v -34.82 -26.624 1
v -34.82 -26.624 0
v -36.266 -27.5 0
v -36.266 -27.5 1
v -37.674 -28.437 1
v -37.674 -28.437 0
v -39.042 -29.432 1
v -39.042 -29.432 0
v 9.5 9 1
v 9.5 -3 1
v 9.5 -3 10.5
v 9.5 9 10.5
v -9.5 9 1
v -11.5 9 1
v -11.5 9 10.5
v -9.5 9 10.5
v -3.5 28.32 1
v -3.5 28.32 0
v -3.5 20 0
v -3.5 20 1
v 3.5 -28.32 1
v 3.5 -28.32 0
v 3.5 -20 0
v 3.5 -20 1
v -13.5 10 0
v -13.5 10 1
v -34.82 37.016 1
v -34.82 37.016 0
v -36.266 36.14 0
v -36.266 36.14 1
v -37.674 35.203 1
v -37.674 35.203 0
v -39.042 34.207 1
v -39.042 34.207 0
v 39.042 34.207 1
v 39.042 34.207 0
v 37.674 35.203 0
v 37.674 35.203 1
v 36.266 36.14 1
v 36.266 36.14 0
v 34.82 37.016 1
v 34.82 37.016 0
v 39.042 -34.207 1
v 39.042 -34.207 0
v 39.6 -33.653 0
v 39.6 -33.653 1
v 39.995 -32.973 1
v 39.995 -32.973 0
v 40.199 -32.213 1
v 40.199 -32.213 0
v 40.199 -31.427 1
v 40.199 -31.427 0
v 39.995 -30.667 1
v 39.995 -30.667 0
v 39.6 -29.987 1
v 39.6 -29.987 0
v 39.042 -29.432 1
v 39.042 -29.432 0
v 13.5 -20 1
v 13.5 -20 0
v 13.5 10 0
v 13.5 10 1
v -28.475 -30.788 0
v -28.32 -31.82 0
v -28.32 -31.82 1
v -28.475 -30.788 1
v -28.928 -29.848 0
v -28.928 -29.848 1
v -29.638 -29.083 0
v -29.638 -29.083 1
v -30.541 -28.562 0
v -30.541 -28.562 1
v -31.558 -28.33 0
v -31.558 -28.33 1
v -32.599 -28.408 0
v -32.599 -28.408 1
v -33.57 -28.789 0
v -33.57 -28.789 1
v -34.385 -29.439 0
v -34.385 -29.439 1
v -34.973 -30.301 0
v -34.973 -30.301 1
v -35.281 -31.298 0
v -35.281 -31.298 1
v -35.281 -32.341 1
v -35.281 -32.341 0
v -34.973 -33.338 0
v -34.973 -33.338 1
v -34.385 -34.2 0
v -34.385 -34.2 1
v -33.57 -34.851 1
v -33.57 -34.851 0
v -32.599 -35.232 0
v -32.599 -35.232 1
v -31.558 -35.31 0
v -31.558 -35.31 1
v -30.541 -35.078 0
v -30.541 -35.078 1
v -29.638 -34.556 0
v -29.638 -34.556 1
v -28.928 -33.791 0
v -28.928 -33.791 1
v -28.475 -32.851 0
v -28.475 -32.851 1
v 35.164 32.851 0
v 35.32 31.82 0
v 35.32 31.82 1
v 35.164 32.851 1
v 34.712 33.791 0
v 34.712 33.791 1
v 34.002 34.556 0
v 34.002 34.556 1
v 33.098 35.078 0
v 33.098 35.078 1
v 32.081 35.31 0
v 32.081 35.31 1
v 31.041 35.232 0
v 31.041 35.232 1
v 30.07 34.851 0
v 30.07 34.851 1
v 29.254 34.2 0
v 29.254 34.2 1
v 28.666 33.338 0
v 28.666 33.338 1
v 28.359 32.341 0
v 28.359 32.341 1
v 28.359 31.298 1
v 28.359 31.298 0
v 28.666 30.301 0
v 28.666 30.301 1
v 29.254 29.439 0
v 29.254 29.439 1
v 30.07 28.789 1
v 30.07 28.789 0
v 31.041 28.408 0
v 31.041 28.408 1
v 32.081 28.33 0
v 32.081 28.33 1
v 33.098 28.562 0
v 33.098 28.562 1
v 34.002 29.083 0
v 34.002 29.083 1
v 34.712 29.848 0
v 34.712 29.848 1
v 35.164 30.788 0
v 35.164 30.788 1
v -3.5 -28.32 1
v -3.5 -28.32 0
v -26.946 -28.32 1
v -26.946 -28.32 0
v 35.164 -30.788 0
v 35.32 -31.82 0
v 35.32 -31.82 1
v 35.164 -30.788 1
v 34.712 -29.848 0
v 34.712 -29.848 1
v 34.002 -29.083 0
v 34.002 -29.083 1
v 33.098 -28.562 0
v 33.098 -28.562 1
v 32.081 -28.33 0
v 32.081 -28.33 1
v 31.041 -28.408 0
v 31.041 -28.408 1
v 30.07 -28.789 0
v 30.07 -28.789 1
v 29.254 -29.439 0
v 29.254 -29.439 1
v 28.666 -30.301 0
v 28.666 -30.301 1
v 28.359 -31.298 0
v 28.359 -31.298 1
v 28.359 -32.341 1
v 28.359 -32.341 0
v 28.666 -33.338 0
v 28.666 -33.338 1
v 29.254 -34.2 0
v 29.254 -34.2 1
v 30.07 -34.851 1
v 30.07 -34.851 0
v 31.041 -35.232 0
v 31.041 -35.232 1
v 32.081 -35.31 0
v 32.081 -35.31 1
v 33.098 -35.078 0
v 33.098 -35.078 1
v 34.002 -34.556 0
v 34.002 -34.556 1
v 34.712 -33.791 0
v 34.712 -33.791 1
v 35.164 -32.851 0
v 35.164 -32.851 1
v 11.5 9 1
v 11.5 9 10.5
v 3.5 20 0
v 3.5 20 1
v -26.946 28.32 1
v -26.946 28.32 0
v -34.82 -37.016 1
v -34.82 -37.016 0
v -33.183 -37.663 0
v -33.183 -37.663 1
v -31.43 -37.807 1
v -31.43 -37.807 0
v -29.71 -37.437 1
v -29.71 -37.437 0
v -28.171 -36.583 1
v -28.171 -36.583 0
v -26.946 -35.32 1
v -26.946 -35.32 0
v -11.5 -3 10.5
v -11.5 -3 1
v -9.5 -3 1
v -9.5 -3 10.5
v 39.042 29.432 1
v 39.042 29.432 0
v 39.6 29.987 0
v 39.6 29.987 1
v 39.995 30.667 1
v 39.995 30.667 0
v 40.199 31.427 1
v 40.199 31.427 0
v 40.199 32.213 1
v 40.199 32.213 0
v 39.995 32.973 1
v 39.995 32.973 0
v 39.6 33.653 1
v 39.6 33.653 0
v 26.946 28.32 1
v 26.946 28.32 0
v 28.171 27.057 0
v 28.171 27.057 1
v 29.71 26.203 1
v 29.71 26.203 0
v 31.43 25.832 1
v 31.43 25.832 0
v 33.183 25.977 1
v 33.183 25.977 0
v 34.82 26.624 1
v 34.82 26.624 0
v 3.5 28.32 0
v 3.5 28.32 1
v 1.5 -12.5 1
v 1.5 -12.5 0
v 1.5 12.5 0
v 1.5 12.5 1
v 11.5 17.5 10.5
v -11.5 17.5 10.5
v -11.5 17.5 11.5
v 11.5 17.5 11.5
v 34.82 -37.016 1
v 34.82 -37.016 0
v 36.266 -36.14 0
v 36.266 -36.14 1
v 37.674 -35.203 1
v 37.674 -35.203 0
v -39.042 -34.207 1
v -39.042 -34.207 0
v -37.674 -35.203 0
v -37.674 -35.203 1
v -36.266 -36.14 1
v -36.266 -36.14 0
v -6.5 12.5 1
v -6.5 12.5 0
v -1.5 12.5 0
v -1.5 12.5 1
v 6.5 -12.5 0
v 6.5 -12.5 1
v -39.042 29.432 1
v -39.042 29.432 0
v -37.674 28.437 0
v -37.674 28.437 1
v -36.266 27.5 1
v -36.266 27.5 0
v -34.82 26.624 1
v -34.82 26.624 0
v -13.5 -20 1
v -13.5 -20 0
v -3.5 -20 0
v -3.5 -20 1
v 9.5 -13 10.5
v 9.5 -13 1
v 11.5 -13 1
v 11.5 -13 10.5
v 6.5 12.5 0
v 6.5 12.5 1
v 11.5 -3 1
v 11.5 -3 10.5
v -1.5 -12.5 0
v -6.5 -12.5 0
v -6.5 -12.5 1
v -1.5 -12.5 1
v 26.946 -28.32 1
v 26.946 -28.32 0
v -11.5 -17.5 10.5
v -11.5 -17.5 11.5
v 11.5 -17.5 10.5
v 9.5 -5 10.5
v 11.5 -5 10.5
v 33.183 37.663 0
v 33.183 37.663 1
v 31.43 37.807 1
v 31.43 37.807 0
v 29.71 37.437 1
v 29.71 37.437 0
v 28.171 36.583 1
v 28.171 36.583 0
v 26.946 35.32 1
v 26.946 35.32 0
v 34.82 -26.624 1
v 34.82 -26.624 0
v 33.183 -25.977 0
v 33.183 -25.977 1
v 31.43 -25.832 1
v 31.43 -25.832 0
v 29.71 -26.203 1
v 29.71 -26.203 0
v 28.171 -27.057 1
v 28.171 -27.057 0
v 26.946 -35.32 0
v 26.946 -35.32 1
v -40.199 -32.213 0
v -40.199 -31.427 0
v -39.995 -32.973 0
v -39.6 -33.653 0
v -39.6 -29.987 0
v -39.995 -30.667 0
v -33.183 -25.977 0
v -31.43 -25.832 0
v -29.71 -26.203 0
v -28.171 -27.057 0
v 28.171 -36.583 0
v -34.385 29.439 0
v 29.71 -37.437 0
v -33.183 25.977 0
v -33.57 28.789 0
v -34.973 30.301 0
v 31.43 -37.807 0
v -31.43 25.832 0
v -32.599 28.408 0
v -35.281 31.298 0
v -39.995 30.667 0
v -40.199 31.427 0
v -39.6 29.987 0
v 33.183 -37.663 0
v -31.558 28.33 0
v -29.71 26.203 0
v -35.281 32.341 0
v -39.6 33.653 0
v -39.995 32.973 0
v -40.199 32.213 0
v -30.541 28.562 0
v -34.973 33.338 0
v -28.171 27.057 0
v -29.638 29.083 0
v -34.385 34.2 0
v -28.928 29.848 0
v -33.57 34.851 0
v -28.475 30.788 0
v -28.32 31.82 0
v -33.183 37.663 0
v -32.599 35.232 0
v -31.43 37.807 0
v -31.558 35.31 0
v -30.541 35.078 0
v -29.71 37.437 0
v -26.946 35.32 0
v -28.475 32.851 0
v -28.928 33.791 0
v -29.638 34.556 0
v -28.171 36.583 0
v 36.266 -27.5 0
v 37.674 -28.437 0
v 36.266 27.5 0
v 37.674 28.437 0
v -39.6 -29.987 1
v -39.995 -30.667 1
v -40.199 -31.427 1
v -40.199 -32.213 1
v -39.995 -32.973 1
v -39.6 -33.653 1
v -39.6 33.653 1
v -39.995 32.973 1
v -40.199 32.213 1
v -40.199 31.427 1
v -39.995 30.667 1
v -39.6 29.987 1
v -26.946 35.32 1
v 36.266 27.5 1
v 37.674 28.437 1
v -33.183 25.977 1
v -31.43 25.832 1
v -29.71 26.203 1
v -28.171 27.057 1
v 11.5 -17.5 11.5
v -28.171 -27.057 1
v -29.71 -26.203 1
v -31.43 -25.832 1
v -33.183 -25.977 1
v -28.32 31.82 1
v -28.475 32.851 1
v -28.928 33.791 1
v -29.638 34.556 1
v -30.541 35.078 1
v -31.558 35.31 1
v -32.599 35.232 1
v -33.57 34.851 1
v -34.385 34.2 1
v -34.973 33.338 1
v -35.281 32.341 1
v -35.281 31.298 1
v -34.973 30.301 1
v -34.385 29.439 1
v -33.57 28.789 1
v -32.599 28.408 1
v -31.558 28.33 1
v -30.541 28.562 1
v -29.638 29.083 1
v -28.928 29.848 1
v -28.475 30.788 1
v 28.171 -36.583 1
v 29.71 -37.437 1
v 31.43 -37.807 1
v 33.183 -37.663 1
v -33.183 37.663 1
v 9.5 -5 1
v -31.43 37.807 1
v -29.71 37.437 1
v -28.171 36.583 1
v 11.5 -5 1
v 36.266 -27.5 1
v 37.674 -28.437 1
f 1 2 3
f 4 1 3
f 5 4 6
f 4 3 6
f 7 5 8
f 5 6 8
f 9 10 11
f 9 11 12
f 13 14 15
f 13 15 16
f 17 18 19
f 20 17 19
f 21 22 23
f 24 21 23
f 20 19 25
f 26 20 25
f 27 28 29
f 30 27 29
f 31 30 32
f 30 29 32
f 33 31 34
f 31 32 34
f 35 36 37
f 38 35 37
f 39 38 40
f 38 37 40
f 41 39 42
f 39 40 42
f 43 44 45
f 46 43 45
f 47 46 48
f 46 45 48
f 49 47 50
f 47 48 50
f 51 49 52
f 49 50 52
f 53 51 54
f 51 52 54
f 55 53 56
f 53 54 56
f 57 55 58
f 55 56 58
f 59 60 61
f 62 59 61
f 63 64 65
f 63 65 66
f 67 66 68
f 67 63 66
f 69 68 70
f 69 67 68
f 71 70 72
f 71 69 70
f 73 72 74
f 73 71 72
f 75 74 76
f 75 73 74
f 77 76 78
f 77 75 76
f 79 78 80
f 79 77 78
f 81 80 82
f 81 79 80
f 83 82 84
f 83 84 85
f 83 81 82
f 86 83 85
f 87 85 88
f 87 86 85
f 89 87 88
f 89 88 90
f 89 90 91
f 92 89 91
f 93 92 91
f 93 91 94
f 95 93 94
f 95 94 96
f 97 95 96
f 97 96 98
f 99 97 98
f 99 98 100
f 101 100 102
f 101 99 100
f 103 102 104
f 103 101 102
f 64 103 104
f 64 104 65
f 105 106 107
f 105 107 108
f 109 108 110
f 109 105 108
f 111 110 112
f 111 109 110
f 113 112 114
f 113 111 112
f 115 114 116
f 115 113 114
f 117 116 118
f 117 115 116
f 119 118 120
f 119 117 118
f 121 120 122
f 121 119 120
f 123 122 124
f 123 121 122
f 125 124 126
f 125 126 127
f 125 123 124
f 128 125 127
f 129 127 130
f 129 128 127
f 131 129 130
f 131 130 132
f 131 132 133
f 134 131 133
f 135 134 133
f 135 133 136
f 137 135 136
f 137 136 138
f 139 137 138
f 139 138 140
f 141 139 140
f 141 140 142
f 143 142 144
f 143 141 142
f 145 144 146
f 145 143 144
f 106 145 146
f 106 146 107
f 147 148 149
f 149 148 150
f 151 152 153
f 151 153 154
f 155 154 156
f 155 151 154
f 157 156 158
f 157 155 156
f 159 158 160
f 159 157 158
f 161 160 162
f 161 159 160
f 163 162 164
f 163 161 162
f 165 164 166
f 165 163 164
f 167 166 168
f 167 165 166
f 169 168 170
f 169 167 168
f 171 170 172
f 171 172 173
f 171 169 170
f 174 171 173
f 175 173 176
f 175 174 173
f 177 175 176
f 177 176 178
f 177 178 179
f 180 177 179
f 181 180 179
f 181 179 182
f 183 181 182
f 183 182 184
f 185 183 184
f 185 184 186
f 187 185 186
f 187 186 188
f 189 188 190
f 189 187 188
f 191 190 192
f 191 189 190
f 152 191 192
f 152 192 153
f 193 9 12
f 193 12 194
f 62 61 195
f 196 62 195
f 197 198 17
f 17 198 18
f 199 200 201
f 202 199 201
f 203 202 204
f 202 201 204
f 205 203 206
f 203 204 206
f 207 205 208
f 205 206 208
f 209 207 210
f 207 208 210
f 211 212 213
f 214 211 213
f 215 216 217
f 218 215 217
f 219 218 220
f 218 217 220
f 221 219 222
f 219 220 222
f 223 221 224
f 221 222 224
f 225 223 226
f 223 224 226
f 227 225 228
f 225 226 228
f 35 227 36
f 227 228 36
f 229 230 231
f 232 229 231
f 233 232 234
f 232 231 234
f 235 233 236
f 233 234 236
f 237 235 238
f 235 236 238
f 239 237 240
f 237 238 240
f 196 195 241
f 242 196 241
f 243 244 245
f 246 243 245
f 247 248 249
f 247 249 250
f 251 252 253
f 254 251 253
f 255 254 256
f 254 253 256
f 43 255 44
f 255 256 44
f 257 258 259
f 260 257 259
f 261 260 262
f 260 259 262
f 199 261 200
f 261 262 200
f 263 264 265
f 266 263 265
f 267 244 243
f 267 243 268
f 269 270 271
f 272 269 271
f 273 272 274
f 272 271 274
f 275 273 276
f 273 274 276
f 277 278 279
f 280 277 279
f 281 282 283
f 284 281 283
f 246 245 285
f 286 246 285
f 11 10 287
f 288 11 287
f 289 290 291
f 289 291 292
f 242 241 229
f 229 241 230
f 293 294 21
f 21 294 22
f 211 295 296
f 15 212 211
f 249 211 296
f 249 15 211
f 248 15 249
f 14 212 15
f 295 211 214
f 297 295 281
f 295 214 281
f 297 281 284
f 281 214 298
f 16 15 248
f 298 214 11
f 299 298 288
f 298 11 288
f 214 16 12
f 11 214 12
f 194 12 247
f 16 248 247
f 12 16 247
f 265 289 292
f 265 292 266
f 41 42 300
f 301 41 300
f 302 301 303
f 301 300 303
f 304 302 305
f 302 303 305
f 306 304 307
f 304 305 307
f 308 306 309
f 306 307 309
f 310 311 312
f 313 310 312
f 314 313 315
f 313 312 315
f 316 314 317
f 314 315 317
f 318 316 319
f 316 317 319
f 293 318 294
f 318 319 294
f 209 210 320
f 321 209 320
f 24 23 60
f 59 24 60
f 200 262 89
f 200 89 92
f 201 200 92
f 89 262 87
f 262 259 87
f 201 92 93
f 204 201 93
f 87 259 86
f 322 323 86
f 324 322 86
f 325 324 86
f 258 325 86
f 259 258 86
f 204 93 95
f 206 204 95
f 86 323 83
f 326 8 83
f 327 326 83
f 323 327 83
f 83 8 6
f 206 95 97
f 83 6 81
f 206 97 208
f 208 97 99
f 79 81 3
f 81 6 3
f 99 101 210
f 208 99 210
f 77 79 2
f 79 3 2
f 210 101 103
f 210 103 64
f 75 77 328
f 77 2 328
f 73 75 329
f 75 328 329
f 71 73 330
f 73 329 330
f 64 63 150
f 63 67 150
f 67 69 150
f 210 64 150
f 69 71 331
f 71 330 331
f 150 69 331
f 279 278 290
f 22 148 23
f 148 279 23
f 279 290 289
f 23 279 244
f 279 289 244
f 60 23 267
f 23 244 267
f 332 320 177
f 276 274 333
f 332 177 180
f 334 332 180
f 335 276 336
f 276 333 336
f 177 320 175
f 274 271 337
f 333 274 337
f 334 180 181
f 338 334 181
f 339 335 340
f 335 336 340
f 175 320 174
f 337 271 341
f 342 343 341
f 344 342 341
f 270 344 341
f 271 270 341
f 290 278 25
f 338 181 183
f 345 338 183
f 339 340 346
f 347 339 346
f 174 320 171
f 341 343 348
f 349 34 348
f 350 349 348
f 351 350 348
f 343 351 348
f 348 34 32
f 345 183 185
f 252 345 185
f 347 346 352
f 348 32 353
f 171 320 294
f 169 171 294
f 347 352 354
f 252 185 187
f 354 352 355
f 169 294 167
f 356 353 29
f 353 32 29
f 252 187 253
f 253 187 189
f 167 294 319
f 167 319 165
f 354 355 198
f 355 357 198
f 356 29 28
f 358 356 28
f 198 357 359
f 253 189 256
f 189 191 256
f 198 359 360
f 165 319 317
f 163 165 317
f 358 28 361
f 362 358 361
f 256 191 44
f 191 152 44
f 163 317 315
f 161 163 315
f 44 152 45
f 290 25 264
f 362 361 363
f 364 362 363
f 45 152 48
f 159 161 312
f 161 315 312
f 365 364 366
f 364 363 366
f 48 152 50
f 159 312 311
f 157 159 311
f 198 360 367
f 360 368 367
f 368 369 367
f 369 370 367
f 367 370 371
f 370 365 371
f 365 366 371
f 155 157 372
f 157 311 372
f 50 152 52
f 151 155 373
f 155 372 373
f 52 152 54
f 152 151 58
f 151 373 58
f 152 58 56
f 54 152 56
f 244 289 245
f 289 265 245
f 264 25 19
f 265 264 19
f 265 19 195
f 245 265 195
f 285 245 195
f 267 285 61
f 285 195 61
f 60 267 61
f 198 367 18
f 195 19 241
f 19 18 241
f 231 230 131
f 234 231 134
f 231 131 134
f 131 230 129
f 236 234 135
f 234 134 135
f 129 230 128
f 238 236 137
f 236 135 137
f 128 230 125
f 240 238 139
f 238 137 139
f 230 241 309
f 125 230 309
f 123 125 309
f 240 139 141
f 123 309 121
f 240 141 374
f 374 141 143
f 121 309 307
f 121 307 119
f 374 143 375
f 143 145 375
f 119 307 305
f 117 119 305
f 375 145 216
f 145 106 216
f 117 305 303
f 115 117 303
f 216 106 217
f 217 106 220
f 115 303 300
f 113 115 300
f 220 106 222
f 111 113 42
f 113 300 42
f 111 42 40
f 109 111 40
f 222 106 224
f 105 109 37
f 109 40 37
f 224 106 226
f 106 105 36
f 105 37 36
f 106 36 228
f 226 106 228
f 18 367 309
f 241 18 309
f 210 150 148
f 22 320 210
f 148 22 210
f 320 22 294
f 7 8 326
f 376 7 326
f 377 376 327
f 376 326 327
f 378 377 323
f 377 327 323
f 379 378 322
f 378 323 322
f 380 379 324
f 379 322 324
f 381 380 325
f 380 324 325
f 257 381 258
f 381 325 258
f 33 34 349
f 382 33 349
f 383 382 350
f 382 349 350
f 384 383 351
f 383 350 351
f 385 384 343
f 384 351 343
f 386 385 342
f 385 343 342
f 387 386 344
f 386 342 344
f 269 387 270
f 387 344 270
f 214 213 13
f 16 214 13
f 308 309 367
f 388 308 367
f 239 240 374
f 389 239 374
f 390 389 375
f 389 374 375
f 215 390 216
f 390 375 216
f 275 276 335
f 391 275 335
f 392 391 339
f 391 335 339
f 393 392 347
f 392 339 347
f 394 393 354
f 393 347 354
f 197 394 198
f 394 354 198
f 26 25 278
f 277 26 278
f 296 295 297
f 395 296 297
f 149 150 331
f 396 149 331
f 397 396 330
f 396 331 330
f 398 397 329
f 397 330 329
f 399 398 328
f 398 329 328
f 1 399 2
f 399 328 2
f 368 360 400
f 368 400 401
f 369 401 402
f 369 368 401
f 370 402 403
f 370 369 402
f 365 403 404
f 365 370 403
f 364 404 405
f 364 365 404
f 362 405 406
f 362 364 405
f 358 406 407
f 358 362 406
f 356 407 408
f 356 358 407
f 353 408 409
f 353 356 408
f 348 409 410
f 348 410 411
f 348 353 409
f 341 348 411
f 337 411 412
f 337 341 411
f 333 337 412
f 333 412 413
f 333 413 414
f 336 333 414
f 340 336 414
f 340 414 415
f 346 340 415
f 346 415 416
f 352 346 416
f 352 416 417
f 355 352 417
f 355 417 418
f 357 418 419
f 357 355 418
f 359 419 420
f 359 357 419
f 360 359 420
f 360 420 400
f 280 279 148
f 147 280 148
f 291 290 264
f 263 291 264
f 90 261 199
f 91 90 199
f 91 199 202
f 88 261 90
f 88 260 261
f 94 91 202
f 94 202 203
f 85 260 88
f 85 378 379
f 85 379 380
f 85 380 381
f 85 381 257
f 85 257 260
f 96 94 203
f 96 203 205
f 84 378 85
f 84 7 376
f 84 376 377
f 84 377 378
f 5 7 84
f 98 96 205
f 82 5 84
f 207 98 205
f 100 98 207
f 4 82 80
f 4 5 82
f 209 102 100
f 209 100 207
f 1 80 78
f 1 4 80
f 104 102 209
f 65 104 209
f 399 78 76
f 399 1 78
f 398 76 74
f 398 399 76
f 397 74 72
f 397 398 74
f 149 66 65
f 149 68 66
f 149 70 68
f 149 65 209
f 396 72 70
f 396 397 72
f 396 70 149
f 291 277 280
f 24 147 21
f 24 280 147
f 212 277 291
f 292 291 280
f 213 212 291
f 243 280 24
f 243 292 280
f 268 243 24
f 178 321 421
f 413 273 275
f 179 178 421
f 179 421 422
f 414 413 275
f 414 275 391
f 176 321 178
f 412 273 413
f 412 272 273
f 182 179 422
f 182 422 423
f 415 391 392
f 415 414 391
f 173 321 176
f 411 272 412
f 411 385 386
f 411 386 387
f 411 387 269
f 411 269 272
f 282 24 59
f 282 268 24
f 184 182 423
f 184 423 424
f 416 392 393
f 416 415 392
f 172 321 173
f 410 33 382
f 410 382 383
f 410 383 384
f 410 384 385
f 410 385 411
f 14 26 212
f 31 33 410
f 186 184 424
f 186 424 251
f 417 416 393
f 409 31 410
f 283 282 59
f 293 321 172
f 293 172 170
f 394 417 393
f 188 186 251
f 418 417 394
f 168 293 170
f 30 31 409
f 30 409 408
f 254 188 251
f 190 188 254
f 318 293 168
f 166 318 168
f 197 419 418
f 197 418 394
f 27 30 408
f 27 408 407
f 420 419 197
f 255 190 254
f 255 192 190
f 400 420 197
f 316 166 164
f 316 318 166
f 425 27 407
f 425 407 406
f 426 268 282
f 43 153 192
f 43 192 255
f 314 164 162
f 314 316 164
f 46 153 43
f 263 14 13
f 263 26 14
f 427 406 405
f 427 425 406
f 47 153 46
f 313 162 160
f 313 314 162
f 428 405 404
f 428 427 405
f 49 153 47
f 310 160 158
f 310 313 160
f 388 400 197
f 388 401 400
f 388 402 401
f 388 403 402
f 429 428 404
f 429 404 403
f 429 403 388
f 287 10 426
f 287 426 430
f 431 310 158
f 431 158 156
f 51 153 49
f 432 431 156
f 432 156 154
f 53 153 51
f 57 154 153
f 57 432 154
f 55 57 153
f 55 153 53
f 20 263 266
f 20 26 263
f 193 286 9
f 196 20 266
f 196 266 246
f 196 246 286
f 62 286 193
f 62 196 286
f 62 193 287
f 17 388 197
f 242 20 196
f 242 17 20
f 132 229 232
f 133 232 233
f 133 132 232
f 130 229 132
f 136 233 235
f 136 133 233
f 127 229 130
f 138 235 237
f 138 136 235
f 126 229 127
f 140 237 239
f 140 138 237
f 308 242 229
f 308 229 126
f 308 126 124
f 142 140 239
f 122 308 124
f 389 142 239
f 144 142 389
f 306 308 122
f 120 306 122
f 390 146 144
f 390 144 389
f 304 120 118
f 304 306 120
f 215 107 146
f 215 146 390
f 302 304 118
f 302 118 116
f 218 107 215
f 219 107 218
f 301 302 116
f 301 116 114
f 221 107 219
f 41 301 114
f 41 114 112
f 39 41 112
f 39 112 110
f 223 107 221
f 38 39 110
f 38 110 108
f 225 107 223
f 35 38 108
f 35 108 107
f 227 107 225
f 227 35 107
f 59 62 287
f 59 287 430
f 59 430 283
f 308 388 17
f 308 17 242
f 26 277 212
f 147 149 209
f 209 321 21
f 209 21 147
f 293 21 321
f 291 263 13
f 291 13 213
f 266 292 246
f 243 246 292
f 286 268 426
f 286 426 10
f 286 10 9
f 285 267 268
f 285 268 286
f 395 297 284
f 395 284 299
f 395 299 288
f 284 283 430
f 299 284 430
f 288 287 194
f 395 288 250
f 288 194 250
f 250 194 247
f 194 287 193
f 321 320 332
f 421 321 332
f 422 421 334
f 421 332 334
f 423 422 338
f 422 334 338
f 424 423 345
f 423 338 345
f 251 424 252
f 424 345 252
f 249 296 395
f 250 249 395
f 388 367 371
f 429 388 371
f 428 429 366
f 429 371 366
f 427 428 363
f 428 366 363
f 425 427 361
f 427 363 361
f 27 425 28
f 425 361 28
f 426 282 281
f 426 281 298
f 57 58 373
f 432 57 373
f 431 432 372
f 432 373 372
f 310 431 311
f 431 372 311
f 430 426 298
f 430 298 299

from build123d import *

# Parameters (mm, degrees)
F0_R     = 3.5
F0_W     = 5
F0_H     = 25
F1_DEPTH = 1
F2_W     = 2
F2_H     = 12
F2_H_2   = 8
F3_DEPTH = 9.5
F4_W     = 23
F4_H     = 35
F5_DEPTH = 1


with BuildPart() as f1:
    # F0 (on Top) → F1 (new body)
    with BuildSketch(Plane.XY):
        with BuildLine():
            Line((3.5, -20), (13.5, -20))
            Line((13.5, -20), (13.5, 10))
            Line((13.5, 10), (3.5, 20))
            Line((3.5, 20), (3.5, 28.319805))
            Line((3.5, 28.319805), (26.946408, 28.319805))
            ThreePointArc((26.946408, 28.319805), (30.556224, 25.954367), (34.819805, 26.623653))
            ThreePointArc((34.819805, 26.623653), (36.975362, 27.961046), (39.041812, 29.432384))
            ThreePointArc((39.041812, 29.432384), (40.225162, 31.819805), (39.041812, 34.207227))
            ThreePointArc((39.041812, 34.207227), (36.975362, 35.678564), (34.819805, 37.015958))
            ThreePointArc((34.819805, 37.015958), (30.556224, 37.685243), (26.946408, 35.319805))
            Line((26.946408, 35.319805), (-26.946408, 35.319805))
            ThreePointArc((-26.946408, 35.319805), (-30.556224, 37.685243), (-34.819805, 37.015958))
            ThreePointArc((-34.819805, 37.015958), (-36.975362, 35.678564), (-39.041812, 34.207227))
            ThreePointArc((-39.041812, 34.207227), (-40.225162, 31.819805), (-39.041812, 29.432384))
            ThreePointArc((-39.041812, 29.432384), (-36.975362, 27.961046), (-34.819805, 26.623653))
            ThreePointArc((-34.819805, 26.623653), (-30.556224, 25.954367), (-26.946408, 28.319805))
            Line((-26.946408, 28.319805), (-3.5, 28.319805))
            Line((-3.5, 28.319805), (-3.5, 20))
            Line((-3.5, 20), (-13.5, 10))
            Line((-13.5, 10), (-13.5, -20))
            Line((-13.5, -20), (-3.5, -20))
            Line((-3.5, -20), (-3.5, -28.319805))
            Line((-3.5, -28.319805), (-26.946408, -28.319805))
            ThreePointArc((-26.946408, -28.319805), (-30.556224, -25.954367), (-34.819805, -26.623653))
            ThreePointArc((-34.819805, -26.623653), (-36.975362, -27.961046), (-39.041812, -29.432384))
            ThreePointArc((-39.041812, -29.432384), (-40.225162, -31.819805), (-39.041812, -34.207227))
            ThreePointArc((-39.041812, -34.207227), (-36.975362, -35.678564), (-34.819805, -37.015958))
            ThreePointArc((-34.819805, -37.015958), (-30.556224, -37.685243), (-26.946408, -35.319805))
            Line((-26.946408, -35.319805), (26.946408, -35.319805))
            ThreePointArc((26.946408, -35.319805), (30.556224, -37.685243), (34.819805, -37.015958))
            ThreePointArc((34.819805, -37.015958), (36.975362, -35.678564), (39.041812, -34.207227))
            ThreePointArc((39.041812, -34.207227), (40.225162, -31.819805), (39.041812, -29.432384))
            ThreePointArc((39.041812, -29.432384), (36.975362, -27.961046), (34.819805, -26.623653))
            ThreePointArc((34.819805, -26.623653), (30.556224, -25.954367), (26.946408, -28.319805))
            Line((26.946408, -28.319805), (3.5, -28.319805))
            Line((3.5, -28.319805), (3.5, -20))
        make_face()
        with Locations((-31.819805, -31.819805)):
            Circle(F0_R, mode=Mode.SUBTRACT)
        with Locations((31.819805, -31.819805)):
            Circle(F0_R, mode=Mode.SUBTRACT)
        with Locations((-4, 0)):
            Rectangle(F0_W, F0_H, mode=Mode.SUBTRACT)
        with Locations((-31.819805, 31.819805)):
            Circle(F0_R, mode=Mode.SUBTRACT)
        with Locations((4, 0)):
            Rectangle(F0_W, F0_H, mode=Mode.SUBTRACT)
        with Locations((31.819805, 31.819805)):
            Circle(F0_R, mode=Mode.SUBTRACT)
    extrude(amount=F1_DEPTH)

    # F2 (on face) → F3 (join)
    with BuildSketch(Plane.XY.offset(1)):
        with Locations((-10.5, 3)):
            Rectangle(F2_W, F2_H)
        with Locations((10.5, 3)):
            Rectangle(F2_W, F2_H)
        with Locations((10.5, -9)):
            Rectangle(F2_W, F2_H_2)
    extrude(amount=F3_DEPTH)

    # F4 (on face) → F5 (join)
    with BuildSketch(Plane.XY.offset(10.5)):
        Rectangle(F4_W, F4_H)
    extrude(amount=F5_DEPTH)


solid = f1.part
